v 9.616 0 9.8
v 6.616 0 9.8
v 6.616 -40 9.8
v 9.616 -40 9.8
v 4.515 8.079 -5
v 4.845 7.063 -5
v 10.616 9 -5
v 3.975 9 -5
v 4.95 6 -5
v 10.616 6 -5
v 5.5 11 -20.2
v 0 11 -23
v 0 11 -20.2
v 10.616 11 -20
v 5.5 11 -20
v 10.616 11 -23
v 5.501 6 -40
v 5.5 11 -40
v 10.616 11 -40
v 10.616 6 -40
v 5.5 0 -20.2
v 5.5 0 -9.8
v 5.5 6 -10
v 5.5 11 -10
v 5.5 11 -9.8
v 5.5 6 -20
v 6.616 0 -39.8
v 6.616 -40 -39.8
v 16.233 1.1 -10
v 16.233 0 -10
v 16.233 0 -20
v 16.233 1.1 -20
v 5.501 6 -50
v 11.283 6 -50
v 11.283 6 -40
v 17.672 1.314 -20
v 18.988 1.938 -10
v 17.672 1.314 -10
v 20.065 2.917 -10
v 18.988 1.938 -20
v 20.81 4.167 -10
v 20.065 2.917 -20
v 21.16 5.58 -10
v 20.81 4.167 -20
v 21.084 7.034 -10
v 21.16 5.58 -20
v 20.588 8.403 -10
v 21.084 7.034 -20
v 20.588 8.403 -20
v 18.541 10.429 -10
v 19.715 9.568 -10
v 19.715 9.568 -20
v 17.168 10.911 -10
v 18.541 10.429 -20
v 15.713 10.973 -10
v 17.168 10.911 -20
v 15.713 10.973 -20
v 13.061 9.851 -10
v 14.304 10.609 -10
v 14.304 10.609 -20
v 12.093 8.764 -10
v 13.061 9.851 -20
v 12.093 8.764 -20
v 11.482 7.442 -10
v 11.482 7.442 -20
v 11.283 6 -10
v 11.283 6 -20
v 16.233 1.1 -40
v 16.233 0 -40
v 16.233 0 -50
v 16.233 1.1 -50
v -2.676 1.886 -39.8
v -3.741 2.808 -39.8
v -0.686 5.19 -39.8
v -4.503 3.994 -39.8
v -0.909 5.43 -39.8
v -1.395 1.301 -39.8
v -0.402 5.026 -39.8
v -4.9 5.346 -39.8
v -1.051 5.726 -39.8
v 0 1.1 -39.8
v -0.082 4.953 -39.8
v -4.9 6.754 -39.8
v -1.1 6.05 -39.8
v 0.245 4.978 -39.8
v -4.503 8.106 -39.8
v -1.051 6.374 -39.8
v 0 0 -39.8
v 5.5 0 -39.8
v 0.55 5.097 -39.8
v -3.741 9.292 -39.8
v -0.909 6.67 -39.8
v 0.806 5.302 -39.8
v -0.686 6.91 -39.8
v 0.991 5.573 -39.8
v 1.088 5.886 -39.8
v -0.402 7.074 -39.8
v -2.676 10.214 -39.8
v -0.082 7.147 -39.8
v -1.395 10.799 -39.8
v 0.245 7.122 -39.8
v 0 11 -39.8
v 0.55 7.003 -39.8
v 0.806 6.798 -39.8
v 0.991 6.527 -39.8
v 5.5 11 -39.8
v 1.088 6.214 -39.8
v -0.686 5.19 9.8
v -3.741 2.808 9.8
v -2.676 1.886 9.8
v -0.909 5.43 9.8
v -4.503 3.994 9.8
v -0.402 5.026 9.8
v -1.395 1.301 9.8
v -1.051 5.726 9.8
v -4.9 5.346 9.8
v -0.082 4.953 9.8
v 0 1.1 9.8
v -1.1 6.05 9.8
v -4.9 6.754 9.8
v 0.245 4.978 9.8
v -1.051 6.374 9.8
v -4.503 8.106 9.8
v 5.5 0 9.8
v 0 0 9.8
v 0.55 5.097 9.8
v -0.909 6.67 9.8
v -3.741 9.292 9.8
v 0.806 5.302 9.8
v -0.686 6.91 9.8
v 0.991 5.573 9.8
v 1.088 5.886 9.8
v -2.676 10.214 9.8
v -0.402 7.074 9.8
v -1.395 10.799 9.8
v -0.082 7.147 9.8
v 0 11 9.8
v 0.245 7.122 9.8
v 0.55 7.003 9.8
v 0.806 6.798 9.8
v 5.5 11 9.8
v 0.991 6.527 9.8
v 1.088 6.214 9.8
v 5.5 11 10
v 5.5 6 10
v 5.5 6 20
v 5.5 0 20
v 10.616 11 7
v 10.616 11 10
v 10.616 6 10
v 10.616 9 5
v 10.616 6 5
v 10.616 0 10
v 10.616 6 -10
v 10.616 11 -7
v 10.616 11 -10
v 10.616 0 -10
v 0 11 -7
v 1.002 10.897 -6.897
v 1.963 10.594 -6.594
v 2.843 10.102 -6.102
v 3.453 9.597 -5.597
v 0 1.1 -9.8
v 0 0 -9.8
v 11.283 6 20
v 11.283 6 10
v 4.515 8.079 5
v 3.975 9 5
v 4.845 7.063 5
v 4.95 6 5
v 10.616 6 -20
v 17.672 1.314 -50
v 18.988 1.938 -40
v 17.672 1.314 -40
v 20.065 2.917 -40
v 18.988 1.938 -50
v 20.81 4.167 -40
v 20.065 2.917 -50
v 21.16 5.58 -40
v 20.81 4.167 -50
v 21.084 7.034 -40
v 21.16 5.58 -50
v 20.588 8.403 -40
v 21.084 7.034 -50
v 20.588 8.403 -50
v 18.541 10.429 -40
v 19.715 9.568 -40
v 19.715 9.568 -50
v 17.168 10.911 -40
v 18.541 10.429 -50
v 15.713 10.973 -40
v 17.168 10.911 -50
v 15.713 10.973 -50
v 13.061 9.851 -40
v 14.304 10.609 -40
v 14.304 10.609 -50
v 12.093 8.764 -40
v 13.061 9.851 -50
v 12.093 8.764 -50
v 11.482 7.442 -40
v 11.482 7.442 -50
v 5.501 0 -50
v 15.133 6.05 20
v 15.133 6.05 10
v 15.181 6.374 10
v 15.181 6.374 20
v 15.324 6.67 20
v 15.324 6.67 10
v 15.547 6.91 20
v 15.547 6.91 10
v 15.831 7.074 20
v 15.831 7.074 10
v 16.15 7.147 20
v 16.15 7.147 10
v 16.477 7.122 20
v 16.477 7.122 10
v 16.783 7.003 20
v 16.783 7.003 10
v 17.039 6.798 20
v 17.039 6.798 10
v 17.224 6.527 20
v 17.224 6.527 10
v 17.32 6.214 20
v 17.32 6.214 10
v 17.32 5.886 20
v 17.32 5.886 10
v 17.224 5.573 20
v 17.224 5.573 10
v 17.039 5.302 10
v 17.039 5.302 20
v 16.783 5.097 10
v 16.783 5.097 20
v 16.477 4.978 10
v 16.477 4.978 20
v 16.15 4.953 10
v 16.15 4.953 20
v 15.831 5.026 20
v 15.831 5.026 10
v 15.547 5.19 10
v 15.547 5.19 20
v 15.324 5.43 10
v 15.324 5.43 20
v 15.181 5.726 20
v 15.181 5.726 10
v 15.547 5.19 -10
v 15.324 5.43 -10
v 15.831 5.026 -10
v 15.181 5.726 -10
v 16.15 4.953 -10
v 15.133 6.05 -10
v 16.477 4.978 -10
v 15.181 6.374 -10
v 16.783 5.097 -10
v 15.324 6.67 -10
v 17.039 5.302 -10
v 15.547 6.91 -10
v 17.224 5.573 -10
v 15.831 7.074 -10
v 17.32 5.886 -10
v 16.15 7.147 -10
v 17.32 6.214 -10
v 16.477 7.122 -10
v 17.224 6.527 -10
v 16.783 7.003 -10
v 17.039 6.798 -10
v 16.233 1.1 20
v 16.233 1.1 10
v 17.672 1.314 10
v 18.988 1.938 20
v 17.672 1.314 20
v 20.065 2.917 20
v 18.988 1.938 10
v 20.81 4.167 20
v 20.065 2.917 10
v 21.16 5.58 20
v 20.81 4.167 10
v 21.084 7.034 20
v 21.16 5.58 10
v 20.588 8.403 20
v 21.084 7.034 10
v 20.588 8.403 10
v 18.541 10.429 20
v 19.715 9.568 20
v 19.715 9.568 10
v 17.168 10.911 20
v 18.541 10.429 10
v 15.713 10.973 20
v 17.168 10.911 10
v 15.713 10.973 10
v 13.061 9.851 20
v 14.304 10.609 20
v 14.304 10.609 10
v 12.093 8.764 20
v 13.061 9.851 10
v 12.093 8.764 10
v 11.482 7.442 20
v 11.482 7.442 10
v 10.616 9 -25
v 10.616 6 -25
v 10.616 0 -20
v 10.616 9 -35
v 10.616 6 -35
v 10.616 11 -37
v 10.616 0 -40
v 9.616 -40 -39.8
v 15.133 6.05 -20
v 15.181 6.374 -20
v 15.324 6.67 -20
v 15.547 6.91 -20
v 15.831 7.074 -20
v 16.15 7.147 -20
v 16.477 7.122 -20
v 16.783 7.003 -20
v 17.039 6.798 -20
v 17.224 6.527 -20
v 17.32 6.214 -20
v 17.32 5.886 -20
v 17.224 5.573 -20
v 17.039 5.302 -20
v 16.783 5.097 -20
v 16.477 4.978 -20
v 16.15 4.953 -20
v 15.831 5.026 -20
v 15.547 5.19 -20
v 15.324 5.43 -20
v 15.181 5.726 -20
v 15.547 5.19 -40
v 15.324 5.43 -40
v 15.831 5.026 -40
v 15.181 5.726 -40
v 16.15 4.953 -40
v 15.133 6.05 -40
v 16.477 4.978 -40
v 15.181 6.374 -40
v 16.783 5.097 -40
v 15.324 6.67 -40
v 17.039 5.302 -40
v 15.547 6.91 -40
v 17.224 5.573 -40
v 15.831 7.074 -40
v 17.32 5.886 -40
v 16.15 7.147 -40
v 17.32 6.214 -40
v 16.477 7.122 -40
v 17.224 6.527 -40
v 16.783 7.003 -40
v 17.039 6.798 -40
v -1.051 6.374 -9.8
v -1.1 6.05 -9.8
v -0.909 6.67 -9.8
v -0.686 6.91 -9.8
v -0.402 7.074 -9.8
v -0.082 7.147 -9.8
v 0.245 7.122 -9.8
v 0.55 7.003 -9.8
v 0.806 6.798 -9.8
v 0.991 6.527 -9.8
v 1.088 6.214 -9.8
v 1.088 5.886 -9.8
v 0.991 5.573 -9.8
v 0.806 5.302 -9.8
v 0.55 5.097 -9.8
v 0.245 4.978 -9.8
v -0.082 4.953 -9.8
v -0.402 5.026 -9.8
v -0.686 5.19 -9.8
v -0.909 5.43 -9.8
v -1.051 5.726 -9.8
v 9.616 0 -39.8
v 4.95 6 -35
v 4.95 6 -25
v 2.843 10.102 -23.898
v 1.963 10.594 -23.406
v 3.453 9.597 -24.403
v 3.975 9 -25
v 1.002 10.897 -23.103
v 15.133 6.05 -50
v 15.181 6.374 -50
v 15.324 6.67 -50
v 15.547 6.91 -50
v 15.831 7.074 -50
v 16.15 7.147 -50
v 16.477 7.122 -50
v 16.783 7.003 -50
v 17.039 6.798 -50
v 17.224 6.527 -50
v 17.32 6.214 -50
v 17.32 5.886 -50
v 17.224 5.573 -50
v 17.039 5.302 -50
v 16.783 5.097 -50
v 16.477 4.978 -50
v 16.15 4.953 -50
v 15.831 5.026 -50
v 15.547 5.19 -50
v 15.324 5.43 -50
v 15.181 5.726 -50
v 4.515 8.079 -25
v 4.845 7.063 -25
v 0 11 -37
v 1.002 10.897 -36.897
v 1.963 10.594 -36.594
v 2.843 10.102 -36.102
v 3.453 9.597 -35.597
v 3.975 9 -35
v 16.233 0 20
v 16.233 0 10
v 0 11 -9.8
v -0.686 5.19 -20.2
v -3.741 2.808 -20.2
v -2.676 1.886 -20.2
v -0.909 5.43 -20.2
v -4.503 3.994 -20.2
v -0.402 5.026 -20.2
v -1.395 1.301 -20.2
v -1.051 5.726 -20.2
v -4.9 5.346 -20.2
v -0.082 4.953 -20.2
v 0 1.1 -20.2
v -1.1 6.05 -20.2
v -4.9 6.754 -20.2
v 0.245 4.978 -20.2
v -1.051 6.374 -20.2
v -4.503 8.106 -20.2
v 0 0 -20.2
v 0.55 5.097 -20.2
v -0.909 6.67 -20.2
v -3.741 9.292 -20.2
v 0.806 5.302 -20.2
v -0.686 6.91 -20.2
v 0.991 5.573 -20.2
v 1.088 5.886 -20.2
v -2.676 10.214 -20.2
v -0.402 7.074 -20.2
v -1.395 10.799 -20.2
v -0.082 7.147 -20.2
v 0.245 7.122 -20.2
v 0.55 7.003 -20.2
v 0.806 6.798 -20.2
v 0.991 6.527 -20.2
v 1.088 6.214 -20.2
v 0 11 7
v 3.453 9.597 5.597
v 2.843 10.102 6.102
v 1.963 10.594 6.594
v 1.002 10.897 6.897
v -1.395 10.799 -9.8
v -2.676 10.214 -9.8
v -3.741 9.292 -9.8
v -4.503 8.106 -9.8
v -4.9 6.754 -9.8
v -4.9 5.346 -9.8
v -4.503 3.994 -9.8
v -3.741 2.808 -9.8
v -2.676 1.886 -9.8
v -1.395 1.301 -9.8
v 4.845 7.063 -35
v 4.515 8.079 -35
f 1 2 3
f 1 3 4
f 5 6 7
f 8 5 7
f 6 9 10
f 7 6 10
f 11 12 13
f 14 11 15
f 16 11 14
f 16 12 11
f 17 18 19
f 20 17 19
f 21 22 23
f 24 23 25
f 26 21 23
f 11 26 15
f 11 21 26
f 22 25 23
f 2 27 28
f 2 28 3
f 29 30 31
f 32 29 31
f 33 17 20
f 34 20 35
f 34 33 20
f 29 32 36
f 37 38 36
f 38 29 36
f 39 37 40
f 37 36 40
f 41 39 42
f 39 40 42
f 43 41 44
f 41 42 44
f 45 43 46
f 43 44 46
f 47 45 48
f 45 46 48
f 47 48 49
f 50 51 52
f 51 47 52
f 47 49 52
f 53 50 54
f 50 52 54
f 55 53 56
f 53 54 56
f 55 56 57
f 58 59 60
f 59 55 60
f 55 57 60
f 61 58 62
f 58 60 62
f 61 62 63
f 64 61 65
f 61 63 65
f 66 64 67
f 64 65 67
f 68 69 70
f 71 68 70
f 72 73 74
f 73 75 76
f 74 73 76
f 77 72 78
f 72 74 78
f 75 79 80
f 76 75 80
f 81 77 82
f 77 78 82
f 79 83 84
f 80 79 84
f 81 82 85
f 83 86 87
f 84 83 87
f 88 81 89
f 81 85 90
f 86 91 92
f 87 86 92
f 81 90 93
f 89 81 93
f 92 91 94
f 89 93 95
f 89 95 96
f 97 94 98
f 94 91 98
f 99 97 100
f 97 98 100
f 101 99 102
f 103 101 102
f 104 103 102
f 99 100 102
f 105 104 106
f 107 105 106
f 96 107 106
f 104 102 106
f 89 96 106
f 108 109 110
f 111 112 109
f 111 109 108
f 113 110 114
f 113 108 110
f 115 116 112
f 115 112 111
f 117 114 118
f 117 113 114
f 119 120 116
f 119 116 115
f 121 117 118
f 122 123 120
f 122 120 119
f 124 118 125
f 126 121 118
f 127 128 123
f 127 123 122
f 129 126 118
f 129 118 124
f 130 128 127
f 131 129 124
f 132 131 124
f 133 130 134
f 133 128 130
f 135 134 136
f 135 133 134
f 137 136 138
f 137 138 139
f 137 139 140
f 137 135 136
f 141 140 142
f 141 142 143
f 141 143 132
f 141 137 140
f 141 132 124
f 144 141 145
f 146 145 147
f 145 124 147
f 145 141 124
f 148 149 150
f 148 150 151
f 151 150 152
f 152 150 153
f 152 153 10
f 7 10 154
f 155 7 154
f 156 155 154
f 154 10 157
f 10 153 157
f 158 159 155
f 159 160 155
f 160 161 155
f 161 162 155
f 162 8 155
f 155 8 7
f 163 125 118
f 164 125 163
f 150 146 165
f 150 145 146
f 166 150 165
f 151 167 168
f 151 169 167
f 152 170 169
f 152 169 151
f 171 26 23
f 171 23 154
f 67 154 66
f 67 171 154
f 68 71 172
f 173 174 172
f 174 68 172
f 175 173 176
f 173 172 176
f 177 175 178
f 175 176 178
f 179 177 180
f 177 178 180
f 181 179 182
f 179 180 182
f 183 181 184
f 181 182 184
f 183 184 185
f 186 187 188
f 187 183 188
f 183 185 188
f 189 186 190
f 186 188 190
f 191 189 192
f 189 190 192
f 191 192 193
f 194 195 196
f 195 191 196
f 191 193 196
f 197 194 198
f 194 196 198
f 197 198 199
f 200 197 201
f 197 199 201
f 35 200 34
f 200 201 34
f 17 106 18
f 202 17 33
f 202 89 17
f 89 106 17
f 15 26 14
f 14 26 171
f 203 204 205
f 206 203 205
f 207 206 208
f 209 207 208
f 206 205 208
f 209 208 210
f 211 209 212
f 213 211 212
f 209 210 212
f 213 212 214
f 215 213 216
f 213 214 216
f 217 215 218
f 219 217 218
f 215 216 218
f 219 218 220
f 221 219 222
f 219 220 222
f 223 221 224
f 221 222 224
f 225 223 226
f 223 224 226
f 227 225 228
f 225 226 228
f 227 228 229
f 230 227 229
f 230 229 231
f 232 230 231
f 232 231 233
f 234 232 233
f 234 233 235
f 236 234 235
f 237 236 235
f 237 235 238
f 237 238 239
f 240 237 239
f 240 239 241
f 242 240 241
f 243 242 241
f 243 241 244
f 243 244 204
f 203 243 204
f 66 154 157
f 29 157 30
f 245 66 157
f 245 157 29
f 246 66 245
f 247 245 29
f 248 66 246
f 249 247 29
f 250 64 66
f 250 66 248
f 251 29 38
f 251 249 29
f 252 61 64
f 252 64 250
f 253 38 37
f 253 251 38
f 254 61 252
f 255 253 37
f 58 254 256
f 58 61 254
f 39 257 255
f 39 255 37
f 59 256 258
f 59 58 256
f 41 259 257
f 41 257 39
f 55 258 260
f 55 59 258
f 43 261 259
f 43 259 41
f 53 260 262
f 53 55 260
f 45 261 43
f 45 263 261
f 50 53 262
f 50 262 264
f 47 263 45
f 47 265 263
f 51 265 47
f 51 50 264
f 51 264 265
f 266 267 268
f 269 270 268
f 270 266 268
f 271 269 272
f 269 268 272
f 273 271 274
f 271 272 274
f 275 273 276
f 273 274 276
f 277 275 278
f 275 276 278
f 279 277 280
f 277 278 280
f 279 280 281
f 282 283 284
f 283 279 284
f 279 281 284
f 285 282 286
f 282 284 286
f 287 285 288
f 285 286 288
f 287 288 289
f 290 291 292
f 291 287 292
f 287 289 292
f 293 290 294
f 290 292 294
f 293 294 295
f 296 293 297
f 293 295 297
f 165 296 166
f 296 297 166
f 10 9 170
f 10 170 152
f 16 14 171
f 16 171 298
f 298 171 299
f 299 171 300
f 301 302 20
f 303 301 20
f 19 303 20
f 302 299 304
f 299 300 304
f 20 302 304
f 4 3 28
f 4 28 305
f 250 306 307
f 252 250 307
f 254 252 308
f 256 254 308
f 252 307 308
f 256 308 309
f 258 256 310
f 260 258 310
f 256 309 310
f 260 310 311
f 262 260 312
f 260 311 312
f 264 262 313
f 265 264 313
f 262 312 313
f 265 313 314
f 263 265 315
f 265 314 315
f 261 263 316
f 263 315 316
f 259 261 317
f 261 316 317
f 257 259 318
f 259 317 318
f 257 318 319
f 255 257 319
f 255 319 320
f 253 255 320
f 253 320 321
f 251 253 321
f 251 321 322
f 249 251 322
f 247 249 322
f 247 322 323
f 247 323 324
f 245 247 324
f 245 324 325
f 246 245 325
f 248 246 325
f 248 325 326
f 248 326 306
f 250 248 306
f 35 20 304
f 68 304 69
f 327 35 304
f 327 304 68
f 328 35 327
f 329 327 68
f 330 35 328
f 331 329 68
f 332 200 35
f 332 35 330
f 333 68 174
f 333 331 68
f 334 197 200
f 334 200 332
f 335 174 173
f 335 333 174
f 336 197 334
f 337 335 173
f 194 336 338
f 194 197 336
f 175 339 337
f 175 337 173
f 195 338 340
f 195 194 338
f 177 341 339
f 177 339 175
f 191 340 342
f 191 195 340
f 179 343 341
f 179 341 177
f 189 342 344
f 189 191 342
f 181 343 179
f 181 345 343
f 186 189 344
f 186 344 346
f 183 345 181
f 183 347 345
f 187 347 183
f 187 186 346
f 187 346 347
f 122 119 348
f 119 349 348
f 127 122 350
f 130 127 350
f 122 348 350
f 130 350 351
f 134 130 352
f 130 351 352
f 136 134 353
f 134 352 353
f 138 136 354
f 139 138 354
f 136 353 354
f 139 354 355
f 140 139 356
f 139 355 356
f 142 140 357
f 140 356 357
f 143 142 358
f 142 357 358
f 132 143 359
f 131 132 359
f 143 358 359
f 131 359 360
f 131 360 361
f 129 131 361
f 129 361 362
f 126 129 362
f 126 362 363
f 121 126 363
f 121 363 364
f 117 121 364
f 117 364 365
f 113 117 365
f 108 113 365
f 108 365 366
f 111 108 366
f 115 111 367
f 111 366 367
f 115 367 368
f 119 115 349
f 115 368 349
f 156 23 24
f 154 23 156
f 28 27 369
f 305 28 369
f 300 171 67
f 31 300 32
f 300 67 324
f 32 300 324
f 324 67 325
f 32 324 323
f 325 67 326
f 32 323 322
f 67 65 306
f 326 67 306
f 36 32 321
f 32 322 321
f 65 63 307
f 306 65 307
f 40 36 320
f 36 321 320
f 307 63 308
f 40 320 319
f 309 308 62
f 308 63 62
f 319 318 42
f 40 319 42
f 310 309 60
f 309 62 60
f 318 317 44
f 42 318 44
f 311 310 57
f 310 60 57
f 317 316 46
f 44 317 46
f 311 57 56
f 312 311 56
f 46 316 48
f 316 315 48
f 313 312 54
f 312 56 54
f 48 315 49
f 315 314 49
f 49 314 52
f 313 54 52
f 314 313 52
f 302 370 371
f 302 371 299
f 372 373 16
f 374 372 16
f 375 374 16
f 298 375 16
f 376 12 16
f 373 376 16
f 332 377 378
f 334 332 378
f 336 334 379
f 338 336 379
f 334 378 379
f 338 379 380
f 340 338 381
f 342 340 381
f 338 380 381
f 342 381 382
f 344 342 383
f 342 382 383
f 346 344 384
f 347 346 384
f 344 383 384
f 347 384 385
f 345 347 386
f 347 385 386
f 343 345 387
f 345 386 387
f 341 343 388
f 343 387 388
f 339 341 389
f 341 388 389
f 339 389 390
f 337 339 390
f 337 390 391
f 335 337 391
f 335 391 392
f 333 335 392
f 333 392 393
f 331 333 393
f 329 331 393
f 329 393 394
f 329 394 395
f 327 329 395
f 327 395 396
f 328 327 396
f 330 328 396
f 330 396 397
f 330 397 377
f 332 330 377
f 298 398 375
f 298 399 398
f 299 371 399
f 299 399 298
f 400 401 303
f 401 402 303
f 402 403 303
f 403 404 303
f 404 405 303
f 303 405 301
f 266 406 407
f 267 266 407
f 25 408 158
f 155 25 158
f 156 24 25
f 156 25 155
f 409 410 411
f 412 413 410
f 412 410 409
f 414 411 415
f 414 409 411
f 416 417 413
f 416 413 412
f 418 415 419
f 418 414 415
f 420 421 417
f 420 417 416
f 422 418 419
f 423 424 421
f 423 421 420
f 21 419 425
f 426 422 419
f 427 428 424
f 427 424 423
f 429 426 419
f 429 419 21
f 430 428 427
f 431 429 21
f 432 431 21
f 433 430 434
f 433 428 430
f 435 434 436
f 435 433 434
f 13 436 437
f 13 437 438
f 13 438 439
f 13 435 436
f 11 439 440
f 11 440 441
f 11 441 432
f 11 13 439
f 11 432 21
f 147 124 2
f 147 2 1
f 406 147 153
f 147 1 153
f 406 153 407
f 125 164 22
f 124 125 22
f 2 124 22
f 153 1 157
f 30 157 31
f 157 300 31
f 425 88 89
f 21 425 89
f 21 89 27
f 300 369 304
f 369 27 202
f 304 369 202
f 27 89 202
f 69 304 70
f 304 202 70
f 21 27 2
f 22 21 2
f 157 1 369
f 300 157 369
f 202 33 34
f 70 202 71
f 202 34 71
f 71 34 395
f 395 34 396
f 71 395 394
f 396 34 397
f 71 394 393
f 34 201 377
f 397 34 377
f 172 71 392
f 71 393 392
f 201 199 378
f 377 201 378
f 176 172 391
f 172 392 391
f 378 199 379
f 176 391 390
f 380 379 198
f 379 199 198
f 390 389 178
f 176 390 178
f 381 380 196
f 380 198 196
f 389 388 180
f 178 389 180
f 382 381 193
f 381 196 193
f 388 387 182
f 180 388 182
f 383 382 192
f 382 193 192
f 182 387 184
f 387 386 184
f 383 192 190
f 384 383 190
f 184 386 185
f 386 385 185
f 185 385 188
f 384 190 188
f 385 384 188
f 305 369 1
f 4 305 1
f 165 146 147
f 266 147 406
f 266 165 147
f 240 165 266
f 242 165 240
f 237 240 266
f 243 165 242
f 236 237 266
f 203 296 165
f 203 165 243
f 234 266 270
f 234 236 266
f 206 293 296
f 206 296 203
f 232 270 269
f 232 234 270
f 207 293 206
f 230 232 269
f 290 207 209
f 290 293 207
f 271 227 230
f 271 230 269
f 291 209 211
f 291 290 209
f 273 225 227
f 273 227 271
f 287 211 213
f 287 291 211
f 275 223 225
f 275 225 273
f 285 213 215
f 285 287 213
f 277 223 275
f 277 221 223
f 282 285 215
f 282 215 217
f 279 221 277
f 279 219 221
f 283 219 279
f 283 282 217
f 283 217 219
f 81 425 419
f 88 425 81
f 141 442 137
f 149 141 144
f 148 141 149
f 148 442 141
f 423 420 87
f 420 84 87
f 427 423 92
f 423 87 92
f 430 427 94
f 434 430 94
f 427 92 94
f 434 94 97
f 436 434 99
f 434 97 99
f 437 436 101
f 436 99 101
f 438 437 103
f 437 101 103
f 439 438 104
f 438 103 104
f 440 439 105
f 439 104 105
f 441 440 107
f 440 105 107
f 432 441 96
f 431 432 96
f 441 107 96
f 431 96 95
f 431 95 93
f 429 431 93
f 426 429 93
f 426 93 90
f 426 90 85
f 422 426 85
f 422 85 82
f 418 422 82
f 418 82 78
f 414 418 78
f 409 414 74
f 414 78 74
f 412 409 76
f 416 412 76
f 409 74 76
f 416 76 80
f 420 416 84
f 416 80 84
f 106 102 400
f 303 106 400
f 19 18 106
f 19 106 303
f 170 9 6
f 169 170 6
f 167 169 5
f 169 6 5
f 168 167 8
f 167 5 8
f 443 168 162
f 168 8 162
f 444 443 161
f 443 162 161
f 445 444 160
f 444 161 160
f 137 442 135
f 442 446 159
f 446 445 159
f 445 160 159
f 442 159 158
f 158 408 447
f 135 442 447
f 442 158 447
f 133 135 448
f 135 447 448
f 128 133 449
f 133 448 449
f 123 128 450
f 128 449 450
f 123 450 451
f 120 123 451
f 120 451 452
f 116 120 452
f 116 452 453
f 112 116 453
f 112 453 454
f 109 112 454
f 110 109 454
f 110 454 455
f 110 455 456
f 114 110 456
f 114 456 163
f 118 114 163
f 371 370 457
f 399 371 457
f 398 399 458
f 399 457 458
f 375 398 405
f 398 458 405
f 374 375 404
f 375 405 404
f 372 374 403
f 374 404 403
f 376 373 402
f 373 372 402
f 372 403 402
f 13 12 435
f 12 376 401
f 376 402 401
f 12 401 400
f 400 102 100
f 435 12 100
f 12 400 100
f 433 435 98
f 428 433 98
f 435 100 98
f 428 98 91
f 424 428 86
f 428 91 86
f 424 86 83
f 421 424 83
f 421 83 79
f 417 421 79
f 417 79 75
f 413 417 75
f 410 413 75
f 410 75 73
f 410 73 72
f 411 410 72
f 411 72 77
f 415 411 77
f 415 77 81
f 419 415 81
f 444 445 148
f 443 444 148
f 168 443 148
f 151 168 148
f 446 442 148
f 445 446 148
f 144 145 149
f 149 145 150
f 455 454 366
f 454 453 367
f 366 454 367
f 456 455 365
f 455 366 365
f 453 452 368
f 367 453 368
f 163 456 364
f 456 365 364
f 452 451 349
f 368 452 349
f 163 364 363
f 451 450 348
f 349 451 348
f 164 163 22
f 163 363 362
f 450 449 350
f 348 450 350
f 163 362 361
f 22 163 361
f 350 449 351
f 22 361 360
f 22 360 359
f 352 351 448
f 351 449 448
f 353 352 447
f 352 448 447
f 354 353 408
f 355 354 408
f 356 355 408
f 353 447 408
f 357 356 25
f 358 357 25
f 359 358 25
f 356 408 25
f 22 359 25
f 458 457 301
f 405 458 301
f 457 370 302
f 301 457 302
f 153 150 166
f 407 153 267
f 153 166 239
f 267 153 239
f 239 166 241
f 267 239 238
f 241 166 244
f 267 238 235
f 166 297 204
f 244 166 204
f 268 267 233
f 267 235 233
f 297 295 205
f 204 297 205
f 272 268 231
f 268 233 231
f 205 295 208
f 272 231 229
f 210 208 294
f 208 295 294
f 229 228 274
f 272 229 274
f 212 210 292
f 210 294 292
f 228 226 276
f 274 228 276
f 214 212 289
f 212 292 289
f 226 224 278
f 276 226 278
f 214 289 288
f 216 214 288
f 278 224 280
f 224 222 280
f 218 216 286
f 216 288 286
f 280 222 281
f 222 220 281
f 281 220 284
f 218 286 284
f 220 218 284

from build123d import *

# Parameters (mm, degrees)
SKETCH1_W             = 10.6165
SKETCH1_H             = 20
SKETCH1_W_2           = 10.732
SKETCH1_H_2           = 10
BOSS_EXTRUDE1_DEPTH   = 6
SKETCH2_W             = 10.6165
SKETCH2_H             = 5
BOSS_EXTRUDE2_DEPTH   = 5
CHAMFER1_SIZE         = 2
BOSS_EXTRUDE3_START   = -10
SKETCH3_R             = 4.95
BOSS_EXTRUDE3_DEPTH   = 20
BOSS_EXTRUDE4_START   = 10
SKETCH3_3_R           = 4.95
BOSS_EXTRUDE4_DEPTH   = 10
BOSS_EXTRUDE5_START   = -20
SKETCH3_4_R           = 4.95
BOSS_EXTRUDE5_DEPTH   = 10
BOSS_EXTRUDE6_START   = -40
SKETCH3_5_R           = 4.95
BOSS_EXTRUDE6_DEPTH   = 20
BOSS_EXTRUDE7_START   = -50
SKETCH3_6_R           = 4.95
BOSS_EXTRUDE7_DEPTH   = 10
F_1_0MM_DOWEL_HOLE1_D = 2.2
CUT_EXTRUDE1_START    = -0.2
CUT_EXTRUDE1_DEPTH    = 0.2
CUT_EXTRUDE2_START    = -30.2
CUT_EXTRUDE2_DEPTH    = 10.4
CUT_EXTRUDE3_START    = -50
CUT_EXTRUDE3_DEPTH    = 0.2
SKETCH10_W            = 3
SKETCH10_H            = 49.6
BOSS_EXTRUDE8_DEPTH   = 40


with BuildPart() as part:
    # Sketch1 → Boss-Extrude1 (new body)
    with BuildSketch(Plane(origin=(0, 0, 0), x_dir=(1, 0, 0), z_dir=(0, 1, 0))):
        Polygon((16.2325, -10), (10.6165, -10), (5.5005, -10), (5.5005, -20), (16.2325, -20), align=None)
        Polygon((10.6165, 0), (0, 0), (0, -10), (5.5005, -10), (10.6165, -10), align=None)
        Polygon((0, 10), (0, 0), (10.6165, 0), (10.6165, 10), (5.5005, 10), align=None)
        Polygon((5.5005, 10), (10.6165, 10), (16.2325, 10), (16.2325, 20), (10.6165, 20), (5.5005, 20), align=None)
        with Locations((5.30825, 30)):
            Rectangle(SKETCH1_W, SKETCH1_H)
        with Locations((10.8665, 45)):
            Rectangle(SKETCH1_W_2, SKETCH1_H_2)
    extrude(amount=BOSS_EXTRUDE1_DEPTH)

    # Sketch2 → Boss-Extrude2 (add)
    with BuildSketch(Plane(origin=(0, 6, 0), x_dir=(1, 0, 0), z_dir=(0, 1, 0))):
        with Locations((5.30825, 7.5)):
            Rectangle(SKETCH2_W, SKETCH2_H)
        with Locations((5.30825, -7.5)):
            Rectangle(SKETCH2_W, SKETCH2_H)
        with Locations((5.30825, 37.5)):
            Rectangle(SKETCH2_W, SKETCH2_H)
        with Locations((5.30825, 22.5)):
            Rectangle(SKETCH2_W, SKETCH2_H)
    extrude(amount=BOSS_EXTRUDE2_DEPTH)

    # Chamfer1
    chamfer1_edges = [part.edges().sort_by_distance(p)[0] for p in [
        (5.30825, 11, -35),
        (5.30825, 11, -25),
        (5.30825, 11, -5),
        (5.30825, 11, 5),
    ]]
    chamfer(chamfer1_edges, length=CHAMFER1_SIZE)

    # Sketch3 → Boss-Extrude3 (add)
    with BuildSketch(Plane.XY.offset(BOSS_EXTRUDE3_START)):
        with Locations((0, 6.05)):
            Circle(SKETCH3_R)
    extrude(amount=BOSS_EXTRUDE3_DEPTH)

    # Sketch3<3> → Boss-Extrude4 (add)
    with BuildSketch(Plane.XY.offset(BOSS_EXTRUDE4_START)):
        with Locations((16.2325, 6.05)):
            Circle(SKETCH3_3_R)
    extrude(amount=BOSS_EXTRUDE4_DEPTH)

    # Sketch3<4> → Boss-Extrude5 (add)
    with BuildSketch(Plane.XY.offset(BOSS_EXTRUDE5_START)):
        with Locations((16.2325, 6.05)):
            Circle(SKETCH3_4_R)
    extrude(amount=BOSS_EXTRUDE5_DEPTH)

    # Sketch3<5> → Boss-Extrude6 (add)
    with BuildSketch(Plane.XY.offset(BOSS_EXTRUDE6_START)):
        with Locations((0, 6.05)):
            Circle(SKETCH3_5_R)
    extrude(amount=BOSS_EXTRUDE6_DEPTH)

    # Sketch3<6> → Boss-Extrude7 (add)
    with BuildSketch(Plane.XY.offset(BOSS_EXTRUDE7_START)):
        with Locations((16.2325, 6.05)):
            Circle(SKETCH3_6_R)
    extrude(amount=BOSS_EXTRUDE7_DEPTH)

    # Ø1.0mm Dowel Hole1 (through all)
    with Locations(Plane.XY.offset(20)):
        with Locations((0, 6.05), (16.2325, 6.05)):
            Hole(F_1_0MM_DOWEL_HOLE1_D / 2)

    # Sketch9 → Cut-Extrude1 (cut)
    with BuildSketch(Plane.XY.offset(10).offset(CUT_EXTRUDE1_START)):
        with BuildLine():
            Line((5.5005, 6), (5.5005, 11))
            Line((5.5005, 11), (0, 11))
            ThreePointArc((0, 11), (-4.95, 6.05), (0, 1.1))
            Line((0, 1.1), (0, 0))
            Line((0, 0), (5.5005, 0))
            Line((5.5005, 0), (5.5005, 6))
        make_face()
    extrude(amount=CUT_EXTRUDE1_DEPTH, mode=Mode.SUBTRACT)

    # Sketch9<2> → Cut-Extrude2 (cut)
    with BuildSketch(Plane.XY.offset(10).offset(CUT_EXTRUDE2_START)):
        with BuildLine():
            Line((5.5005, 0), (5.5005, 6))
            Line((5.5005, 6), (5.5005, 11))
            Line((5.5005, 11), (0, 11))
            ThreePointArc((0, 11), (-4.95, 6.05), (0, 1.1))
            Line((0, 1.1), (0, 0))
            Line((0, 0), (5.5005, 0))
        make_face()
    extrude(amount=CUT_EXTRUDE2_DEPTH, mode=Mode.SUBTRACT)

    # Sketch9<4> → Cut-Extrude3 (cut)
    with BuildSketch(Plane.XY.offset(10).offset(CUT_EXTRUDE3_START)):
        with BuildLine():
            Line((5.5005, 0), (5.5005, 6))
            Line((5.5005, 6), (5.5005, 11))
            Line((5.5005, 11), (0, 11))
            ThreePointArc((0, 11), (-4.95, 6.05), (0, 1.1))
            Line((0, 1.1), (0, 0))
            Line((0, 0), (5.5005, 0))
        make_face()
    extrude(amount=CUT_EXTRUDE3_DEPTH, mode=Mode.SUBTRACT)

    # Sketch10 → Boss-Extrude8 (add)
    with BuildSketch(Plane.XZ):
        with Locations((8.11625, -15)):
            Rectangle(SKETCH10_W, SKETCH10_H)
    extrude(amount=BOSS_EXTRUDE8_DEPTH)


solid = part.part
